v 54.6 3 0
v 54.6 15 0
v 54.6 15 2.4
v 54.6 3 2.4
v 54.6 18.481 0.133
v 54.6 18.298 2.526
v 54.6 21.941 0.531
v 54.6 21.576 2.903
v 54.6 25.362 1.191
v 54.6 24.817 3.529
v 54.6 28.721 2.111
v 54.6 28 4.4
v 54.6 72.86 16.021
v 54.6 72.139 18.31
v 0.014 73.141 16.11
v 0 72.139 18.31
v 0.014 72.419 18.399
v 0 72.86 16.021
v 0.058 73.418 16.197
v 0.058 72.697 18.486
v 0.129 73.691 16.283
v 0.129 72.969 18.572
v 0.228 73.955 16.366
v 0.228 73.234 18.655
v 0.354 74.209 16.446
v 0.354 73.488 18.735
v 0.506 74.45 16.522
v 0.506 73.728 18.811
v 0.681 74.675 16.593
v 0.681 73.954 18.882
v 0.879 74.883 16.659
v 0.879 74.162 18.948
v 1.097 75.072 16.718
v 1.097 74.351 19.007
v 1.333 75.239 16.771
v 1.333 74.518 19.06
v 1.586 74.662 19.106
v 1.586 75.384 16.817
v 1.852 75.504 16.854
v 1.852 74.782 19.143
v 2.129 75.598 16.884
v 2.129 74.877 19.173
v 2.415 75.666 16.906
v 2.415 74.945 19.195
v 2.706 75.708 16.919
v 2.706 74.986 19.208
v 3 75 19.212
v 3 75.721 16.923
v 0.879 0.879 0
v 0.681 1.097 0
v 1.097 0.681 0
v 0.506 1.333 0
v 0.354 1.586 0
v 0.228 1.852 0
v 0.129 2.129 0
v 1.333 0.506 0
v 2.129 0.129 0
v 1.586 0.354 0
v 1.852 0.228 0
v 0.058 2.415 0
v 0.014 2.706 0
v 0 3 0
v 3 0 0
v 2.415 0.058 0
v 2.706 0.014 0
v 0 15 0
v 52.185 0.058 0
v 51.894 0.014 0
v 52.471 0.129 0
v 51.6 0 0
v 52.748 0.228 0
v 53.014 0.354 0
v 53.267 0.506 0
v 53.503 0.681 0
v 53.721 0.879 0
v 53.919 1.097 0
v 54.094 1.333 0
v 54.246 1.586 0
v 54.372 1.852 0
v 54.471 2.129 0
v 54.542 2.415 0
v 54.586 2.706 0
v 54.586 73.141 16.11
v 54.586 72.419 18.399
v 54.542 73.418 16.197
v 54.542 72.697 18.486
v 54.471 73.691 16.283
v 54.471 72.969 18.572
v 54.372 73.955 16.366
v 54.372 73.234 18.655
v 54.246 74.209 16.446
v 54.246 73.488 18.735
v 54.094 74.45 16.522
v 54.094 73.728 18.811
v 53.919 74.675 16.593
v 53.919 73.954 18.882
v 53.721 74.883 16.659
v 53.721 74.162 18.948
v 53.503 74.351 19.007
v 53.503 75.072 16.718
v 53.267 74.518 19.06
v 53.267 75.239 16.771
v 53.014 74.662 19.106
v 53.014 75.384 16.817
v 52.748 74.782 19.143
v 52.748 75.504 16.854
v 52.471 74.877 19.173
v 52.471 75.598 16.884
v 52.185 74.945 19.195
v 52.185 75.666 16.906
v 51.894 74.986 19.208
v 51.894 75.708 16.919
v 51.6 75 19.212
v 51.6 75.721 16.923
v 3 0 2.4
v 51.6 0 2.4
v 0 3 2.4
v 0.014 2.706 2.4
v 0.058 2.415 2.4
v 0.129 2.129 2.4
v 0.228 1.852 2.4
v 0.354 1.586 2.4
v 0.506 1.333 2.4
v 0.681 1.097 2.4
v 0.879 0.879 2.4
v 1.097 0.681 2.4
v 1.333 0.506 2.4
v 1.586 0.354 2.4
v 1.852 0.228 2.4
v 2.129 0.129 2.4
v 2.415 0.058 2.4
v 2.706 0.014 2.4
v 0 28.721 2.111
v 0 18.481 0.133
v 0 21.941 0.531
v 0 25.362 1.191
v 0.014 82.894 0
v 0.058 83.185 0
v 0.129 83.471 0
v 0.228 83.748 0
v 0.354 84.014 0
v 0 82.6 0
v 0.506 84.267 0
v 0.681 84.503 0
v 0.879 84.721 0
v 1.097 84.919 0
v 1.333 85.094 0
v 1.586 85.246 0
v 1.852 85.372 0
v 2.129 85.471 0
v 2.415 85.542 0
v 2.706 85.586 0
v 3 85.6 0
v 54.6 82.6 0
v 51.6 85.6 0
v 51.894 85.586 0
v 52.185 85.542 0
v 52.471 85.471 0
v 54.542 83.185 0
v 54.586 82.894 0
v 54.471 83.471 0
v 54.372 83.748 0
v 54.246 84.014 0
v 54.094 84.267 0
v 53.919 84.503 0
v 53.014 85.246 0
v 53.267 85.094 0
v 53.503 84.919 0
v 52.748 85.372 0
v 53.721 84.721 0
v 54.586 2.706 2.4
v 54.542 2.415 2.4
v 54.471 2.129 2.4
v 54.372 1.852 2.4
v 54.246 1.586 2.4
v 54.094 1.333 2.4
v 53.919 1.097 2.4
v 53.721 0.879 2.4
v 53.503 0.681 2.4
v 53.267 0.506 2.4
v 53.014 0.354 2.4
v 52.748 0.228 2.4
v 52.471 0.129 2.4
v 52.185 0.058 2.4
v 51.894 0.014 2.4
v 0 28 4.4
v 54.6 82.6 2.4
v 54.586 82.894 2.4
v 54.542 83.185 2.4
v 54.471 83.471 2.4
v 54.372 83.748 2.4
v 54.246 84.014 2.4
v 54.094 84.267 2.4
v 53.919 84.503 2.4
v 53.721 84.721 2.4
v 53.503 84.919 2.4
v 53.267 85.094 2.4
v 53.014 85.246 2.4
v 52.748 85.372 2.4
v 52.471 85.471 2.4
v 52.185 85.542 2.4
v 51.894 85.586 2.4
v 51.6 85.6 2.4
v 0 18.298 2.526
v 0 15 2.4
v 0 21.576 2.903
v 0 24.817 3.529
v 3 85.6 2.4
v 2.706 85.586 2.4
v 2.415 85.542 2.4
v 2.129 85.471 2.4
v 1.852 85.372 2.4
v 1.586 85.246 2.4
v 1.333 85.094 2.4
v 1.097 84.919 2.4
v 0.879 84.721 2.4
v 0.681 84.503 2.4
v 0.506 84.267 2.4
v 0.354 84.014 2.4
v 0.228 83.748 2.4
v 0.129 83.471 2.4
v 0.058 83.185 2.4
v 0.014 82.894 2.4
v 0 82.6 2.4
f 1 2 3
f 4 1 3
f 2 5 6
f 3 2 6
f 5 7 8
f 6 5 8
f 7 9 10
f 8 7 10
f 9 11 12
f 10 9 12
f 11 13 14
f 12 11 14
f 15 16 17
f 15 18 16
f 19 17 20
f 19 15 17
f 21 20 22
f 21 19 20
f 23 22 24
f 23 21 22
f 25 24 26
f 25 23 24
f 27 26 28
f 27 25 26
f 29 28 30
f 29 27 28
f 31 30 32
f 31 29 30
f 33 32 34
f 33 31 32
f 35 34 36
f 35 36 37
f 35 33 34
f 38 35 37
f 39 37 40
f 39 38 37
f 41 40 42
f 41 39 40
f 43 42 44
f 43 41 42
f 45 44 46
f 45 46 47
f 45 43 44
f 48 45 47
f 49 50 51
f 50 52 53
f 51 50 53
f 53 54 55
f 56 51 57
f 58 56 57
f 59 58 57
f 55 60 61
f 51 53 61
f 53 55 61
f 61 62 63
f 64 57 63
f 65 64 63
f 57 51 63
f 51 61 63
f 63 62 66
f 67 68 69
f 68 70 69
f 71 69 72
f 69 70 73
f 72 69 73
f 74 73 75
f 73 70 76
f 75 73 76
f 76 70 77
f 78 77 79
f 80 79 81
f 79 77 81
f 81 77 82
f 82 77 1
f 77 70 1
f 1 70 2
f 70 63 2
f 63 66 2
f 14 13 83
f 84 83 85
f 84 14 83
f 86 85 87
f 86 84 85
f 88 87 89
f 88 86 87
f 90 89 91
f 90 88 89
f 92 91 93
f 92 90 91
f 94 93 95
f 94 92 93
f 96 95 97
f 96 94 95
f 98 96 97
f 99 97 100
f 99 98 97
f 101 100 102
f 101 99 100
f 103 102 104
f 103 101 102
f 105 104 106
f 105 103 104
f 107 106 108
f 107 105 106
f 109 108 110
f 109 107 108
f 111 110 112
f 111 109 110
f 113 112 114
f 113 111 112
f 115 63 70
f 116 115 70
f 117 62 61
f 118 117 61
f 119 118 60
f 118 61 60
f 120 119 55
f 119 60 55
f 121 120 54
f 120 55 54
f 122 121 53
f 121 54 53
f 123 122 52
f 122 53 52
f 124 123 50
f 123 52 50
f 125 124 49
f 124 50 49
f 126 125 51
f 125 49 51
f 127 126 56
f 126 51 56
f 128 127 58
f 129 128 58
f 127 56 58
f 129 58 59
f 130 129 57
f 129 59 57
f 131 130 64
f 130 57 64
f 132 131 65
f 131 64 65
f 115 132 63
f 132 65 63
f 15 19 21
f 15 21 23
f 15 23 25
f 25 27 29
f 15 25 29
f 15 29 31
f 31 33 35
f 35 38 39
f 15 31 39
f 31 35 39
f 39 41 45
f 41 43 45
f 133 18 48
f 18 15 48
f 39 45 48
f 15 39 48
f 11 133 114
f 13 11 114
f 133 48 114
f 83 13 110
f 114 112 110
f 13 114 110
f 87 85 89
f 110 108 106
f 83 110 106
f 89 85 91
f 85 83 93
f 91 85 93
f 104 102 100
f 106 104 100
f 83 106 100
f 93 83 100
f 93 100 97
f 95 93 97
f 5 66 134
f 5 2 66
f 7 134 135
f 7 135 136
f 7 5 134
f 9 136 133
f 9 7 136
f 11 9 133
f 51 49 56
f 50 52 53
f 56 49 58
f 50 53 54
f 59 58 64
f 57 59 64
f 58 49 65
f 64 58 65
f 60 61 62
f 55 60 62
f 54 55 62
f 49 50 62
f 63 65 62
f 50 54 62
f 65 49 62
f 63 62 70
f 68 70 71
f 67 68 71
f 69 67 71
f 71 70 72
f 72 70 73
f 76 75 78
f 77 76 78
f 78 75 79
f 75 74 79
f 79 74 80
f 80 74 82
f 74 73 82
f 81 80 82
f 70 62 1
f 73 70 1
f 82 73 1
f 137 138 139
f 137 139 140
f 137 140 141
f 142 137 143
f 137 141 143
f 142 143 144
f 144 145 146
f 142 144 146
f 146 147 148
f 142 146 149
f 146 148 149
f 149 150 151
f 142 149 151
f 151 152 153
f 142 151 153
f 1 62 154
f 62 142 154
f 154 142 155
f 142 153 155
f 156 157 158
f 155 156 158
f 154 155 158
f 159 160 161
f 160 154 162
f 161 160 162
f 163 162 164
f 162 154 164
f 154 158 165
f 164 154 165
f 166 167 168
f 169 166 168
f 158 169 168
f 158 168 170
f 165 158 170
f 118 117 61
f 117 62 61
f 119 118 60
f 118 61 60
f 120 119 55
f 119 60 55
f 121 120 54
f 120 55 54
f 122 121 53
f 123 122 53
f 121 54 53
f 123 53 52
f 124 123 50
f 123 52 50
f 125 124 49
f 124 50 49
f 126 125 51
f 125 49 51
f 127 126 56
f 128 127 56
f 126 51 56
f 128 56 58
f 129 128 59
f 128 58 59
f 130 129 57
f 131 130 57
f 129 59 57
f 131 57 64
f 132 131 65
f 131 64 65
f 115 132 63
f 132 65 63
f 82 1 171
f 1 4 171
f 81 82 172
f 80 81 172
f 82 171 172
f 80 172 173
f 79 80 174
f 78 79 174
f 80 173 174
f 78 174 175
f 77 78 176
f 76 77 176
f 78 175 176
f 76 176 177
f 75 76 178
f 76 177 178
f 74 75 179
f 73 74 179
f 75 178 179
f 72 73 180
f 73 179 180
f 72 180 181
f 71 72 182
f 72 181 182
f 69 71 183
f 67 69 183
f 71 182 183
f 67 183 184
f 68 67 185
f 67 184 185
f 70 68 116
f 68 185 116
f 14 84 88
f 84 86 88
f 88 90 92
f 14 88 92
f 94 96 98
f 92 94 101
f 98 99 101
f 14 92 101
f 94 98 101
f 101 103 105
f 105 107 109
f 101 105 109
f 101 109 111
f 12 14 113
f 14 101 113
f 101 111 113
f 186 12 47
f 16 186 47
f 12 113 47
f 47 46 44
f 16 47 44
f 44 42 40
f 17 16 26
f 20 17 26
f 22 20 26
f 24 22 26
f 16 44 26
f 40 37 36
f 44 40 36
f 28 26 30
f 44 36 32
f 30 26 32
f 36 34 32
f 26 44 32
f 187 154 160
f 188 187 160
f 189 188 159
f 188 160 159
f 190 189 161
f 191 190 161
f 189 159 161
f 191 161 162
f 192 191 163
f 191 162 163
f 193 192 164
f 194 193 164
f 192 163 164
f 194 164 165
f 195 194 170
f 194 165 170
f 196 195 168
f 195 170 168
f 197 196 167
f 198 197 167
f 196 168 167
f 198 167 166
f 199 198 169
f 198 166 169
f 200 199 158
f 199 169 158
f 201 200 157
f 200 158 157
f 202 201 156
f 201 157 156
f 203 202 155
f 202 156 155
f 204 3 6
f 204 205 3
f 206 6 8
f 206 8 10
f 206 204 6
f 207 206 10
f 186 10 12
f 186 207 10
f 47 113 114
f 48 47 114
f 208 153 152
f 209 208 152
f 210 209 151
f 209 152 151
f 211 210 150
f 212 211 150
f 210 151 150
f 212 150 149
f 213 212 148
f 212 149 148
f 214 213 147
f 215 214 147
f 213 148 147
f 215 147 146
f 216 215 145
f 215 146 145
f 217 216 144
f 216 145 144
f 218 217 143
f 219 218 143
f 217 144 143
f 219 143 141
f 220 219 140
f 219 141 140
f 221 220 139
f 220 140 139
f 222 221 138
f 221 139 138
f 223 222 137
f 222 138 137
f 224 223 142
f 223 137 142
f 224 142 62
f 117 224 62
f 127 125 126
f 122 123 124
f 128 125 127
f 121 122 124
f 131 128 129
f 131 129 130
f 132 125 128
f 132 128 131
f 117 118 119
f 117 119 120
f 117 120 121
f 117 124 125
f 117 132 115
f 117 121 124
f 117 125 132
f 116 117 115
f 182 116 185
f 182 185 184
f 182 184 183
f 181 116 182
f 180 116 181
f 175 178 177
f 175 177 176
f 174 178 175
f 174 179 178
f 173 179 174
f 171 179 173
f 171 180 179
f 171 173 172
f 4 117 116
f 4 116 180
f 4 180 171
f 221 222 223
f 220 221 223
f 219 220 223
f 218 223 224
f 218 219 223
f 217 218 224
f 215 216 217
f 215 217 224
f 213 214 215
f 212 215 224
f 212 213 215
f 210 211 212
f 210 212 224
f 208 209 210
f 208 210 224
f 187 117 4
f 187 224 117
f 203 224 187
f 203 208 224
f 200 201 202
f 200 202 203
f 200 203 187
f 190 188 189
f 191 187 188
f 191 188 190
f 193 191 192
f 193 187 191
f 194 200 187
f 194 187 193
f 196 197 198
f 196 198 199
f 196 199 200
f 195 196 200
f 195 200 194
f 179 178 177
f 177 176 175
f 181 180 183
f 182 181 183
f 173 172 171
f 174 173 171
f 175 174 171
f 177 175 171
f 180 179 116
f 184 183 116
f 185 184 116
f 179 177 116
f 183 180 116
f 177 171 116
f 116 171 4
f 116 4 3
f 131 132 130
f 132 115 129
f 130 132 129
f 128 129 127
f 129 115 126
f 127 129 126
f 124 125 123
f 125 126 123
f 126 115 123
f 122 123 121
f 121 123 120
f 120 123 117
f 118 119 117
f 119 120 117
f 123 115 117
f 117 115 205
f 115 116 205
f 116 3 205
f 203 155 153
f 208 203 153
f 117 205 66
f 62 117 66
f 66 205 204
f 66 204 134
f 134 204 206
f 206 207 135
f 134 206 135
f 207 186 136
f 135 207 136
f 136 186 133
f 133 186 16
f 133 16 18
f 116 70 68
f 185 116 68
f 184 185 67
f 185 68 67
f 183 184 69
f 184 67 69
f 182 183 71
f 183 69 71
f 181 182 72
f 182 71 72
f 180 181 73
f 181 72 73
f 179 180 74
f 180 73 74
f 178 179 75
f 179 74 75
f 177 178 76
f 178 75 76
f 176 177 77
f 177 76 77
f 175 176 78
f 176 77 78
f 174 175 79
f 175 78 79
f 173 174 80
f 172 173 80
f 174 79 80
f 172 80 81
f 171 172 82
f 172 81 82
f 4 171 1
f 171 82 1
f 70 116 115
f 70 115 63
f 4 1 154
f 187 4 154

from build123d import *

# Parameters (mm, degrees)
F1_DEPTH = 2.4
F2_W     = 54.6
F2_H     = 2.4
F5_R     = 3


with BuildPart() as f1:
    # F0 (on Top) → F1 (new body)
    with BuildSketch(Plane.XY):
        with BuildLine():
            Line((51.6, 85.6), (3, 85.6))
            ThreePointArc((3, 85.6), (0.8786796564, 84.7213203436), (0, 82.6))
            Line((0, 82.6), (0, 3))
            ThreePointArc((0, 3), (0.8786796564, 0.8786796564), (3, 0))
            Line((3, 0), (51.6, 0))
            ThreePointArc((51.6, 0), (53.7213203436, 0.8786796564), (54.6, 3))
            Line((54.6, 3), (54.6, 82.6))
            ThreePointArc((54.6, 82.6), (53.7213203436, 84.7213203436), (51.6, 85.6))
        make_face()
    extrude(amount=F1_DEPTH)


with BuildPart() as f4:
    # F4: sweep along a path in F3
    with BuildLine(Plane.YZ.offset(54.6)) as f4_path:
        Line((0, 2.4), (15, 2.4))
        ThreePointArc((15, 2.4), (21.576473219, 2.9029240766), (28, 4.4))
        Line((28, 4.4), (75, 19.2121212121))
    # F2 (on face) → F4 (sweep)
    with BuildSketch(Plane.XZ):
        with Locations((27.3, 1.2)):
            Rectangle(F2_W, F2_H)
    sweep(path=f4_path.line)

    # F5
    f5_edges = [f4.edges().sort_by_distance(p)[0] for p in [
        (54.6, 0, 1.2),
        (0, 0, 1.2),
        (54.6, 75.360694, 18.067613),
        (0, 75.360694, 18.067613),
    ]]
    fillet(f5_edges, radius=F5_R)


solid = Compound([f1.part, f4.part])
